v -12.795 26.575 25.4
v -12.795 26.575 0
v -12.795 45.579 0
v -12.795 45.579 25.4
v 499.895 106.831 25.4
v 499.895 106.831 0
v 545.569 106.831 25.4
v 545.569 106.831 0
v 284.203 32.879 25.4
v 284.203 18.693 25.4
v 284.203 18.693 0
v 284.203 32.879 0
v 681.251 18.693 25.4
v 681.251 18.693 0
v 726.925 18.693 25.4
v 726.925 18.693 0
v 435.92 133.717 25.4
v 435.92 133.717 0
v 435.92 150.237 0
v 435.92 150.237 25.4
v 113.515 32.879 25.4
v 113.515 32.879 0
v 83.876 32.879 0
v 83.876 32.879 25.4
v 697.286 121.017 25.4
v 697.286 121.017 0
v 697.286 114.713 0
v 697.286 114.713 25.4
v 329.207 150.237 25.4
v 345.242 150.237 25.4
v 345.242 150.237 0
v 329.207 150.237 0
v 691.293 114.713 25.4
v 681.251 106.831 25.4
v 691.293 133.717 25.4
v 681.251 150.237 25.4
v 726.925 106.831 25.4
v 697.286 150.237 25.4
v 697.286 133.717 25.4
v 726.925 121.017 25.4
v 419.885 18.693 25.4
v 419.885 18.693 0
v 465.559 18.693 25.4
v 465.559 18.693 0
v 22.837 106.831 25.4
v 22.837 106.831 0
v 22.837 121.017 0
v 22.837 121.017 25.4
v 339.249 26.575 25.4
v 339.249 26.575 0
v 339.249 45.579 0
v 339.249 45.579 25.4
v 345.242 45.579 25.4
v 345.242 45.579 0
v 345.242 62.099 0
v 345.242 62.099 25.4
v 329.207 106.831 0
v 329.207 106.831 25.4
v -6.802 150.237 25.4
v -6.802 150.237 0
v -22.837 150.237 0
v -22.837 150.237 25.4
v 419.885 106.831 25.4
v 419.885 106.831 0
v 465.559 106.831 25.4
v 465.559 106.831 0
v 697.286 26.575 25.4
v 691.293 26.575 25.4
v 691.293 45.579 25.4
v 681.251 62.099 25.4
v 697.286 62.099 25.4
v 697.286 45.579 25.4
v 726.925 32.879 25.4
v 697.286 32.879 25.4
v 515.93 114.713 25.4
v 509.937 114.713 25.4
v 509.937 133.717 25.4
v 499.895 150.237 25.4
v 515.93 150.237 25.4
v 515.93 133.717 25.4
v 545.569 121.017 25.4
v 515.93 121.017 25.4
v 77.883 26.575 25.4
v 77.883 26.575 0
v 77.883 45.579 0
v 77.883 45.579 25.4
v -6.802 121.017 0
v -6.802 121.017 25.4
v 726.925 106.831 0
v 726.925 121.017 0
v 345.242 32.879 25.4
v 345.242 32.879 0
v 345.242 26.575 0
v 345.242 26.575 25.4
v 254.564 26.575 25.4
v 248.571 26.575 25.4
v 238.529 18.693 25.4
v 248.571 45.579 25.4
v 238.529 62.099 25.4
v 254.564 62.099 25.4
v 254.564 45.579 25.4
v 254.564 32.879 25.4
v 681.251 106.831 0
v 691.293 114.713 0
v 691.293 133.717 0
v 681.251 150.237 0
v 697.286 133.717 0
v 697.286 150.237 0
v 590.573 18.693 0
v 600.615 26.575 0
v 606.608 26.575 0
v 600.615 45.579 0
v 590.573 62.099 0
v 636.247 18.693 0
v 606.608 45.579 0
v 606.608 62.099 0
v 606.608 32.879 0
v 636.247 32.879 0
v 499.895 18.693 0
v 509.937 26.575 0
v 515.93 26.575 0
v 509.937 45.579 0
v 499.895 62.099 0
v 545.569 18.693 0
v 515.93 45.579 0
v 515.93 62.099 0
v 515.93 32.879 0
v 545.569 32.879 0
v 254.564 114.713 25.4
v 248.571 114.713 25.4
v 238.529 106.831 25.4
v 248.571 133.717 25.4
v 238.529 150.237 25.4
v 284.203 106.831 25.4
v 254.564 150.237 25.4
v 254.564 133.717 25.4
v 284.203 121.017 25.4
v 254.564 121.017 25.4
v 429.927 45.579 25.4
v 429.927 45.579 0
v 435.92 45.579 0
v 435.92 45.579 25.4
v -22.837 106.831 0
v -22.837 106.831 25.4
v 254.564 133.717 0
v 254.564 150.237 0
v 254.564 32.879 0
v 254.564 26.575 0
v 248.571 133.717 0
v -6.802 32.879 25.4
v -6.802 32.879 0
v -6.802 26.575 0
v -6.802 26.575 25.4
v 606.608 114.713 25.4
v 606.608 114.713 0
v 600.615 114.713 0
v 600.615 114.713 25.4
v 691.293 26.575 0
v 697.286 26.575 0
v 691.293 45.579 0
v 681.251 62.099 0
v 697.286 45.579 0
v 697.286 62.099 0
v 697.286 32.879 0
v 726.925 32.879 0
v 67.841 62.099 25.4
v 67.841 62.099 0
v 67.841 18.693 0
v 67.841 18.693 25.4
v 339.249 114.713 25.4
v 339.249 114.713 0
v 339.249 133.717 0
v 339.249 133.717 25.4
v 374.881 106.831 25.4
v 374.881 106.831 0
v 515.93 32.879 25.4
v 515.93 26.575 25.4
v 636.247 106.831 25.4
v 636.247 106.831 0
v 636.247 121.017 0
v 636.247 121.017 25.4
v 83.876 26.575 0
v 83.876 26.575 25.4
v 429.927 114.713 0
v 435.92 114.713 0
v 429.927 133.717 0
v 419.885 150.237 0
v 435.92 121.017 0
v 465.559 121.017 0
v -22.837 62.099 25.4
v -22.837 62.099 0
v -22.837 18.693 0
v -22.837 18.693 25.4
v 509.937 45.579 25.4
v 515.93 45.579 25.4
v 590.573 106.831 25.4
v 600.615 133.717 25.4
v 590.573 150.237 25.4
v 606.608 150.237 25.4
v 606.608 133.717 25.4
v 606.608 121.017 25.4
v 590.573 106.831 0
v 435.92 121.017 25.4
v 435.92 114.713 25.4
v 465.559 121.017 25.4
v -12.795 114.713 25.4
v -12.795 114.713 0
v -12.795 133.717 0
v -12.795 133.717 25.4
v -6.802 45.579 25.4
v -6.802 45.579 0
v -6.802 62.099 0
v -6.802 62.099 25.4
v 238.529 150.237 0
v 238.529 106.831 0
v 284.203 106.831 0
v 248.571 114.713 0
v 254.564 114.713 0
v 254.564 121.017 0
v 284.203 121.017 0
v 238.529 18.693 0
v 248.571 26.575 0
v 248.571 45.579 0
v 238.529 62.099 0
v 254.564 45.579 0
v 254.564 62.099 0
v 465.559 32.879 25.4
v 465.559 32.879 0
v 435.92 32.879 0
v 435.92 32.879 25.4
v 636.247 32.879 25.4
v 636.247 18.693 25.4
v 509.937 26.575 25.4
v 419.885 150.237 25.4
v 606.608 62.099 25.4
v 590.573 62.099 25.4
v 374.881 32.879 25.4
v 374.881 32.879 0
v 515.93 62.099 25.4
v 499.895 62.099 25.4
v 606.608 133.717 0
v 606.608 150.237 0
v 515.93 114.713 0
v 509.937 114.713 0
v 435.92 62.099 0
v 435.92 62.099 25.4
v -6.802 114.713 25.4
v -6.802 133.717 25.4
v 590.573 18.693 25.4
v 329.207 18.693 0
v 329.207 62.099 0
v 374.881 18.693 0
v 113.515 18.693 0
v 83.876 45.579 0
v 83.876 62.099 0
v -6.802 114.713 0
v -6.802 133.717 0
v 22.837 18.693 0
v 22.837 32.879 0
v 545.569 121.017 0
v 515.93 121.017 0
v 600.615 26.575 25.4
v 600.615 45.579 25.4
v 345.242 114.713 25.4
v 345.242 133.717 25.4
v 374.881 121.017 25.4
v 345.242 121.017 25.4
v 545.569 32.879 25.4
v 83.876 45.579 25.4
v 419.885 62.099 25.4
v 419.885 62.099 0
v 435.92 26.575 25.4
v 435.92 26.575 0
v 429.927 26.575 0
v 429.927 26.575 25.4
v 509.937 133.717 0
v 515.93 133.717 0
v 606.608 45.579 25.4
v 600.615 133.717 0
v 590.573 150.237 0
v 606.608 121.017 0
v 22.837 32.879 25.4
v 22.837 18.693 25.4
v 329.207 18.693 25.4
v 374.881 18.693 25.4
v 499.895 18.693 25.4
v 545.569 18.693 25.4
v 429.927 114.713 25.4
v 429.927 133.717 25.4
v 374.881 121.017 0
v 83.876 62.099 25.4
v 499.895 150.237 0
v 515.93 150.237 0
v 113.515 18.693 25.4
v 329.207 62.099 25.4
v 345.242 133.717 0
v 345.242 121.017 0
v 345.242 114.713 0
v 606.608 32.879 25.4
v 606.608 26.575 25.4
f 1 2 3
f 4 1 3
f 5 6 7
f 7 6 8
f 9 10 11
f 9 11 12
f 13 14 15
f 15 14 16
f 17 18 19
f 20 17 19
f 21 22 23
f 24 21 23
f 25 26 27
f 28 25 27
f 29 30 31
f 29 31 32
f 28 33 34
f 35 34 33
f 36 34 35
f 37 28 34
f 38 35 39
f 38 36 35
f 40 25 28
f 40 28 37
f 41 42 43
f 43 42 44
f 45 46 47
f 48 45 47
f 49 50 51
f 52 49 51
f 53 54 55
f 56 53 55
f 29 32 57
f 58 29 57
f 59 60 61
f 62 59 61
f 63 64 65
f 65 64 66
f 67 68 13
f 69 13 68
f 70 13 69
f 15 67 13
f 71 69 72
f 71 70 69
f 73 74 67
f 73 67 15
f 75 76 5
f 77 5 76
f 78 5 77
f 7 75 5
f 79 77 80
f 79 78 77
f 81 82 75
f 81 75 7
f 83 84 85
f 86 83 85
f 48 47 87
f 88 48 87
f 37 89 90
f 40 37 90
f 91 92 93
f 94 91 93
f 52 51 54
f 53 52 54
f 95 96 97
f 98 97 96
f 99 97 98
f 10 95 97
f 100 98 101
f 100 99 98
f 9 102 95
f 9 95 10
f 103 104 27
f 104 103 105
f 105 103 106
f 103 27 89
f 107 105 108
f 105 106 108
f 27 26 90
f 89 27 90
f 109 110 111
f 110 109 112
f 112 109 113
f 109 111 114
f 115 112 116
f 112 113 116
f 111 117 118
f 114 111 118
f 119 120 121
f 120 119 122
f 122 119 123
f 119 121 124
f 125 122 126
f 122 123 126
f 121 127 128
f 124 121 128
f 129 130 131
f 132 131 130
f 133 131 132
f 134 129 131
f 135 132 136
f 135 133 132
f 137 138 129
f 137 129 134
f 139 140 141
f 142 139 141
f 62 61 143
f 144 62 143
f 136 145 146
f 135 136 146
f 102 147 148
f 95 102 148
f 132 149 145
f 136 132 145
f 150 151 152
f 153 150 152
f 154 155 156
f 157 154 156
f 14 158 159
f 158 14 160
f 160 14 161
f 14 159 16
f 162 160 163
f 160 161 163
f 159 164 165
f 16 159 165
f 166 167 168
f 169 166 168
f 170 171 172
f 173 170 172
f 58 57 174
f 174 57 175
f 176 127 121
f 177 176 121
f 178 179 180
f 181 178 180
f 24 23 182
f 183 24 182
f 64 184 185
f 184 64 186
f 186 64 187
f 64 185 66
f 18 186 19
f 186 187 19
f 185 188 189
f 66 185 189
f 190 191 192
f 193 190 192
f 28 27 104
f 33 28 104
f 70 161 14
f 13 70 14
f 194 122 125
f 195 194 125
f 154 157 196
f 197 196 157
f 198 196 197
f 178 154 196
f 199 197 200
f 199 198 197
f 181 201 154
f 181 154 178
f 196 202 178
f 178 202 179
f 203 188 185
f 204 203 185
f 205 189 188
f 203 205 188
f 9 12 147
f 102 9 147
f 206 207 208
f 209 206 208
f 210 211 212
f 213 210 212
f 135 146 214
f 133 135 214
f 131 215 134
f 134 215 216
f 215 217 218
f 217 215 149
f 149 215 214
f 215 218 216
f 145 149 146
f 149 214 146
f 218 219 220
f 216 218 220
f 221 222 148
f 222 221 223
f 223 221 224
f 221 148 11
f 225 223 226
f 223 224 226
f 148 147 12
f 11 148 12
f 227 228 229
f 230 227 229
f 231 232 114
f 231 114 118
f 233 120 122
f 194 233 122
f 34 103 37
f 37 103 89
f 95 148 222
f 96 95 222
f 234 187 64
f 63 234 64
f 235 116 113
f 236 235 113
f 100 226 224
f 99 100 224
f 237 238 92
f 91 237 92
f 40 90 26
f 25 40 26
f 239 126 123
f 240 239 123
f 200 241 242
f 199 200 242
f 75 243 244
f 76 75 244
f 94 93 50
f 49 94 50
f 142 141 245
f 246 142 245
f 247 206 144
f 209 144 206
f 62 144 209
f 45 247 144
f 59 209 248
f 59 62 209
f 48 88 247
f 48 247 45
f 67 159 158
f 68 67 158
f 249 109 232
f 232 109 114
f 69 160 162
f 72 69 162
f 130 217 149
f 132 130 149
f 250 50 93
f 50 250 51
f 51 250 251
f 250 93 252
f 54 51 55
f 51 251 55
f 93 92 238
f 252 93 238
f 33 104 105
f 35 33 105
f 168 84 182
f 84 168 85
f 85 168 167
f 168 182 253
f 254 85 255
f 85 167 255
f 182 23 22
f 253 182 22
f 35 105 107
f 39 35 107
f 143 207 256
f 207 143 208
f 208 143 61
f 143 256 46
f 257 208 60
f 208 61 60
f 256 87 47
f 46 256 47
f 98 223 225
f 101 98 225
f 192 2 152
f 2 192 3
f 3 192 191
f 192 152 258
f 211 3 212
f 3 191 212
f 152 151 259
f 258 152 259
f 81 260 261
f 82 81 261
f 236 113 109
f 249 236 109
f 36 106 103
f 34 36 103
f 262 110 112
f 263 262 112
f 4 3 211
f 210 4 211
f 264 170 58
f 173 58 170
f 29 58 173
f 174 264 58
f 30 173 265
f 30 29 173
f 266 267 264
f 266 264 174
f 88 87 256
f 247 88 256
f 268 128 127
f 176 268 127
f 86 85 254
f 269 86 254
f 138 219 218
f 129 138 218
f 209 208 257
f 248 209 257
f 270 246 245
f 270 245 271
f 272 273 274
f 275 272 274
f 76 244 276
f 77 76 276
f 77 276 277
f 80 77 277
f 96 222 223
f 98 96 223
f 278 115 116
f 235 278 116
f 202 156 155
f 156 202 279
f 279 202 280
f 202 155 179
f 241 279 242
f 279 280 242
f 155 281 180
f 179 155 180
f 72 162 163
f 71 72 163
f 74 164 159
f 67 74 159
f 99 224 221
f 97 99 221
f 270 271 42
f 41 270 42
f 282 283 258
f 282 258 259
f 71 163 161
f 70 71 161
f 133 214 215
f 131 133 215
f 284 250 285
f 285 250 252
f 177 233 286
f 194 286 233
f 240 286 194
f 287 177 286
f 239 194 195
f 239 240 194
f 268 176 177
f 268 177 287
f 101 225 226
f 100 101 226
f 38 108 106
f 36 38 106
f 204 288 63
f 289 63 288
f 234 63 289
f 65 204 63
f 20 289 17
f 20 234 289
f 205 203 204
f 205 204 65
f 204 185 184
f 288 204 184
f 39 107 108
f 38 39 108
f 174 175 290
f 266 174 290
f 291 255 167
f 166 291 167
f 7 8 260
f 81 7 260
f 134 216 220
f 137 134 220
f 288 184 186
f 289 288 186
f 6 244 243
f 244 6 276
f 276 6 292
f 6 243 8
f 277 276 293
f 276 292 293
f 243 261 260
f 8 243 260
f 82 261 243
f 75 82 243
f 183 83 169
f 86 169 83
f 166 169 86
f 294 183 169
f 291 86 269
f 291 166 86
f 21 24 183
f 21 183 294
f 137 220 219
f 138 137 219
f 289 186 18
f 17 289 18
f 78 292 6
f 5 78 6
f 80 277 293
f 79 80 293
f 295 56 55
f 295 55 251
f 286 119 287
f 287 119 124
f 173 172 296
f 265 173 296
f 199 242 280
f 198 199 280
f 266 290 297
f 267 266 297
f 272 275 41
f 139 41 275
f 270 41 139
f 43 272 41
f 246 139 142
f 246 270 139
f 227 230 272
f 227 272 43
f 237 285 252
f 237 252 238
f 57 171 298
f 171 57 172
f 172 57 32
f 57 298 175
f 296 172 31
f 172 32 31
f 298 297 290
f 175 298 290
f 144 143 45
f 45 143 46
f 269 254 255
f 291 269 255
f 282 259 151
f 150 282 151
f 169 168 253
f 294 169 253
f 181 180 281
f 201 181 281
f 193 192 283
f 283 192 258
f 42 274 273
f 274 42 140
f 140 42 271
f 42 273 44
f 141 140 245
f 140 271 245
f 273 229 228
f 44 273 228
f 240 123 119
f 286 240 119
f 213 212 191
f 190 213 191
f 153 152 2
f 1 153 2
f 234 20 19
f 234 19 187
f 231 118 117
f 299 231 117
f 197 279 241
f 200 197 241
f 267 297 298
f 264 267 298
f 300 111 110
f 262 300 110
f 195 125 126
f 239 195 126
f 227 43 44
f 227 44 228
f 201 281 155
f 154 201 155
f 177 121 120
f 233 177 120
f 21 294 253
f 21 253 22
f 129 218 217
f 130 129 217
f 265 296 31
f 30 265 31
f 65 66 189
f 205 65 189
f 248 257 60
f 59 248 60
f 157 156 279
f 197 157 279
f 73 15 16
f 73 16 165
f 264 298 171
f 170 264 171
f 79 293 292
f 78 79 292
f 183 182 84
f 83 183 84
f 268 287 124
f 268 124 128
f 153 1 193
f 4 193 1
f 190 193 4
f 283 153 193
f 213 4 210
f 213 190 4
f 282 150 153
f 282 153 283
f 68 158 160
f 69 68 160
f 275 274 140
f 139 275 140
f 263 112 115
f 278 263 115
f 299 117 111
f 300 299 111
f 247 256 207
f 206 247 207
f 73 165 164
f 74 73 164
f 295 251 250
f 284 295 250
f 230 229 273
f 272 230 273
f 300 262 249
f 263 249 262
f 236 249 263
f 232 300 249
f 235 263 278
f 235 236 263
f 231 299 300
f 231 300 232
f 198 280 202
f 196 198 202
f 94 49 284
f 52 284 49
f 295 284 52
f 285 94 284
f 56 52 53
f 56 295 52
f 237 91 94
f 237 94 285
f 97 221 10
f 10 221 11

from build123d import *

# Parameters (mm, degrees)
F1_DEPTH = 25.4


with BuildPart() as f1:
    # F0 (on Top) → F1 (new body)
    with BuildSketch(Plane.XY):
        Polygon((-6.8024713546, 45.5786075115), (-6.8024713546, 62.0988953531), (-22.8368639946, 62.0988953531), (-22.8368639946, 18.6926565737), (22.8368602693, 18.6926565737), (22.8368602693, 32.8786075115), (-6.8024713546, 32.8786075115), (-6.8024713546, 26.574909687), (-12.7951232716, 26.574909687), (-12.7951232716, 32.8786075115), (-12.7951232716, 45.5786075115), align=None)
    extrude(amount=F1_DEPTH)


with BuildPart() as f1b:
    # F0 (on Top) → F1, piece 2 (new body)
    with BuildSketch(Plane.XY):
        Polygon((-6.8024713546, 133.7166075115), (-6.8024713546, 150.2368953531), (-22.8368639946, 150.2368953531), (-22.8368639946, 106.8306565737), (22.8368602693, 106.8306565737), (22.8368602693, 121.0166075115), (-6.8024713546, 121.0166075115), (-6.8024713546, 114.712909687), (-12.7951232716, 114.712909687), (-12.7951232716, 121.0166075115), (-12.7951232716, 133.7166075115), align=None)
    extrude(amount=F1_DEPTH)


with BuildPart() as f1c:
    # F0 (on Top) → F1, piece 3 (new body)
    with BuildSketch(Plane.XY):
        Polygon((83.8755286454, 45.5786075115), (83.8755286454, 62.0988953531), (67.8411360054, 62.0988953531), (67.8411360054, 18.6926565737), (113.5148602693, 18.6926565737), (113.5148602693, 32.8786075115), (83.8755286454, 32.8786075115), (83.8755286454, 26.574909687), (77.8828767284, 26.574909687), (77.8828767284, 32.8786075115), (77.8828767284, 45.5786075115), align=None)
    extrude(amount=F1_DEPTH)


with BuildPart() as f1d:
    # F0 (on Top) → F1, piece 4 (new body)
    with BuildSketch(Plane.XY):
        Polygon((83.8755286454, 133.7166075115), (83.8755286454, 150.2368953531), (67.8411360054, 150.2368953531), (67.8411360054, 106.8306565737), (113.5148602693, 106.8306565737), (113.5148602693, 121.0166075115), (83.8755286454, 121.0166075115), (83.8755286454, 114.712909687), (77.8828767284, 114.712909687), (77.8828767284, 121.0166075115), (77.8828767284, 133.7166075115), align=None)
    extrude(amount=F1_DEPTH)


with BuildPart() as f1e:
    # F0 (on Top) → F1, piece 5 (new body)
    with BuildSketch(Plane.XY):
        Polygon((174.5535286454, 45.5786075115), (174.5535286454, 62.0988953531), (158.5191360054, 62.0988953531), (158.5191360054, 18.6926565737), (204.1928602693, 18.6926565737), (204.1928602693, 32.8786075115), (174.5535286454, 32.8786075115), (174.5535286454, 26.574909687), (168.5608767284, 26.574909687), (168.5608767284, 32.8786075115), (168.5608767284, 45.5786075115), align=None)
    extrude(amount=F1_DEPTH)


with BuildPart() as f1f:
    # F0 (on Top) → F1, piece 6 (new body)
    with BuildSketch(Plane.XY):
        Polygon((174.5535286454, 133.7166075115), (174.5535286454, 150.2368953531), (158.5191360054, 150.2368953531), (158.5191360054, 106.8306565737), (204.1928602693, 106.8306565737), (204.1928602693, 121.0166075115), (174.5535286454, 121.0166075115), (174.5535286454, 114.712909687), (168.5608767284, 114.712909687), (168.5608767284, 121.0166075115), (168.5608767284, 133.7166075115), align=None)
    extrude(amount=F1_DEPTH)


with BuildPart() as f1g:
    # F0 (on Top) → F1, piece 7 (new body)
    with BuildSketch(Plane.XY):
        Polygon((465.5588602693, 121.0166075115), (435.9195286454, 121.0166075115), (435.9195286454, 114.712909687), (429.9268767284, 114.712909687), (429.9268767284, 121.0166075115), (429.9268767284, 133.7166075115), (435.9195286454, 133.7166075115), (435.9195286454, 150.2368953531), (419.8851360054, 150.2368953531), (419.8851360054, 106.8306565737), (465.5588602693, 106.8306565737), align=None)
    extrude(amount=F1_DEPTH)


with BuildPart() as f1h:
    # F0 (on Top) → F1, piece 8 (new body)
    with BuildSketch(Plane.XY):
        Polygon((284.2028602693, 32.8786075115), (254.5635286454, 32.8786075115), (254.5635286454, 26.574909687), (248.5708767284, 26.574909687), (248.5708767284, 32.8786075115), (248.5708767284, 45.5786075115), (254.5635286454, 45.5786075115), (254.5635286454, 62.0988953531), (238.5291360054, 62.0988953531), (238.5291360054, 18.6926565737), (284.2028602693, 18.6926565737), align=None)
    extrude(amount=F1_DEPTH)


with BuildPart() as f1i:
    # F0 (on Top) → F1, piece 9 (new body)
    with BuildSketch(Plane.XY):
        Polygon((374.8808602693, 32.8786075115), (345.2415286454, 32.8786075115), (345.2415286454, 26.574909687), (339.2488767284, 26.574909687), (339.2488767284, 32.8786075115), (339.2488767284, 45.5786075115), (345.2415286454, 45.5786075115), (345.2415286454, 62.0988953531), (329.2071360054, 62.0988953531), (329.2071360054, 18.6926565737), (374.8808602693, 18.6926565737), align=None)
    extrude(amount=F1_DEPTH)


with BuildPart() as f1j:
    # F0 (on Top) → F1, piece 10 (new body)
    with BuildSketch(Plane.XY):
        Polygon((284.2028602693, 106.8306565737), (284.2028602693, 121.0166075115), (254.5635286454, 121.0166075115), (254.5635286454, 114.712909687), (248.5708767284, 114.712909687), (248.5708767284, 121.0166075115), (248.5708767284, 133.7166075115), (254.5635286454, 133.7166075115), (254.5635286454, 150.2368953531), (238.5291360054, 150.2368953531), (238.5291360054, 106.8306565737), align=None)
    extrude(amount=F1_DEPTH)


with BuildPart() as f1k:
    # F0 (on Top) → F1, piece 11 (new body)
    with BuildSketch(Plane.XY):
        Polygon((465.5588602693, 18.6926565737), (465.5588602693, 32.8786075115), (435.9195286454, 32.8786075115), (435.9195286454, 26.574909687), (429.9268767284, 26.574909687), (429.9268767284, 32.8786075115), (429.9268767284, 45.5786075115), (435.9195286454, 45.5786075115), (435.9195286454, 62.0988953531), (419.8851360054, 62.0988953531), (419.8851360054, 18.6926565737), align=None)
    extrude(amount=F1_DEPTH)


with BuildPart() as f1l:
    # F0 (on Top) → F1, piece 12 (new body)
    with BuildSketch(Plane.XY):
        Polygon((345.2415286454, 150.2368953531), (329.2071360054, 150.2368953531), (329.2071360054, 106.8306565737), (374.8808602693, 106.8306565737), (374.8808602693, 121.0166075115), (345.2415286454, 121.0166075115), (345.2415286454, 114.712909687), (339.2488767284, 114.712909687), (339.2488767284, 121.0166075115), (339.2488767284, 133.7166075115), (345.2415286454, 133.7166075115), align=None)
    extrude(amount=F1_DEPTH)


with BuildPart() as f1m:
    # F0 (on Top) → F1, piece 13 (new body)
    with BuildSketch(Plane.XY):
        Polygon((726.9248602693, 121.0166075115), (697.2855286454, 121.0166075115), (697.2855286454, 114.712909687), (691.2928767284, 114.712909687), (691.2928767284, 121.0166075115), (691.2928767284, 133.7166075115), (697.2855286454, 133.7166075115), (697.2855286454, 150.2368953531), (681.2511360054, 150.2368953531), (681.2511360054, 106.8306565737), (726.9248602693, 106.8306565737), align=None)
    extrude(amount=F1_DEPTH)


with BuildPart() as f1n:
    # F0 (on Top) → F1, piece 14 (new body)
    with BuildSketch(Plane.XY):
        Polygon((545.5688602693, 32.8786075115), (515.9295286454, 32.8786075115), (515.9295286454, 26.574909687), (509.9368767284, 26.574909687), (509.9368767284, 32.8786075115), (509.9368767284, 45.5786075115), (515.9295286454, 45.5786075115), (515.9295286454, 62.0988953531), (499.8951360054, 62.0988953531), (499.8951360054, 18.6926565737), (545.5688602693, 18.6926565737), align=None)
    extrude(amount=F1_DEPTH)


with BuildPart() as f1o:
    # F0 (on Top) → F1, piece 15 (new body)
    with BuildSketch(Plane.XY):
        Polygon((636.2468602693, 32.8786075115), (606.6075286454, 32.8786075115), (606.6075286454, 26.574909687), (600.6148767284, 26.574909687), (600.6148767284, 32.8786075115), (600.6148767284, 45.5786075115), (606.6075286454, 45.5786075115), (606.6075286454, 62.0988953531), (590.5731360054, 62.0988953531), (590.5731360054, 18.6926565737), (636.2468602693, 18.6926565737), align=None)
    extrude(amount=F1_DEPTH)


with BuildPart() as f1p:
    # F0 (on Top) → F1, piece 16 (new body)
    with BuildSketch(Plane.XY):
        Polygon((545.5688602693, 106.8306565737), (545.5688602693, 121.0166075115), (515.9295286454, 121.0166075115), (515.9295286454, 114.712909687), (509.9368767284, 114.712909687), (509.9368767284, 121.0166075115), (509.9368767284, 133.7166075115), (515.9295286454, 133.7166075115), (515.9295286454, 150.2368953531), (499.8951360054, 150.2368953531), (499.8951360054, 106.8306565737), align=None)
    extrude(amount=F1_DEPTH)


with BuildPart() as f1q:
    # F0 (on Top) → F1, piece 17 (new body)
    with BuildSketch(Plane.XY):
        Polygon((726.9248602693, 18.6926565737), (726.9248602693, 32.8786075115), (697.2855286454, 32.8786075115), (697.2855286454, 26.574909687), (691.2928767284, 26.574909687), (691.2928767284, 32.8786075115), (691.2928767284, 45.5786075115), (697.2855286454, 45.5786075115), (697.2855286454, 62.0988953531), (681.2511360054, 62.0988953531), (681.2511360054, 18.6926565737), align=None)
    extrude(amount=F1_DEPTH)


with BuildPart() as f1r:
    # F0 (on Top) → F1, piece 18 (new body)
    with BuildSketch(Plane.XY):
        Polygon((606.6075286454, 150.2368953531), (590.5731360054, 150.2368953531), (590.5731360054, 106.8306565737), (636.2468602693, 106.8306565737), (636.2468602693, 121.0166075115), (606.6075286454, 121.0166075115), (606.6075286454, 114.712909687), (600.6148767284, 114.712909687), (600.6148767284, 121.0166075115), (600.6148767284, 133.7166075115), (606.6075286454, 133.7166075115), align=None)
    extrude(amount=F1_DEPTH)


solid = Compound([f1.part, f1b.part, f1c.part, f1g.part, f1h.part, f1i.part, f1j.part, f1k.part, f1l.part, f1m.part, f1n.part, f1o.part, f1p.part, f1q.part, f1r.part])
